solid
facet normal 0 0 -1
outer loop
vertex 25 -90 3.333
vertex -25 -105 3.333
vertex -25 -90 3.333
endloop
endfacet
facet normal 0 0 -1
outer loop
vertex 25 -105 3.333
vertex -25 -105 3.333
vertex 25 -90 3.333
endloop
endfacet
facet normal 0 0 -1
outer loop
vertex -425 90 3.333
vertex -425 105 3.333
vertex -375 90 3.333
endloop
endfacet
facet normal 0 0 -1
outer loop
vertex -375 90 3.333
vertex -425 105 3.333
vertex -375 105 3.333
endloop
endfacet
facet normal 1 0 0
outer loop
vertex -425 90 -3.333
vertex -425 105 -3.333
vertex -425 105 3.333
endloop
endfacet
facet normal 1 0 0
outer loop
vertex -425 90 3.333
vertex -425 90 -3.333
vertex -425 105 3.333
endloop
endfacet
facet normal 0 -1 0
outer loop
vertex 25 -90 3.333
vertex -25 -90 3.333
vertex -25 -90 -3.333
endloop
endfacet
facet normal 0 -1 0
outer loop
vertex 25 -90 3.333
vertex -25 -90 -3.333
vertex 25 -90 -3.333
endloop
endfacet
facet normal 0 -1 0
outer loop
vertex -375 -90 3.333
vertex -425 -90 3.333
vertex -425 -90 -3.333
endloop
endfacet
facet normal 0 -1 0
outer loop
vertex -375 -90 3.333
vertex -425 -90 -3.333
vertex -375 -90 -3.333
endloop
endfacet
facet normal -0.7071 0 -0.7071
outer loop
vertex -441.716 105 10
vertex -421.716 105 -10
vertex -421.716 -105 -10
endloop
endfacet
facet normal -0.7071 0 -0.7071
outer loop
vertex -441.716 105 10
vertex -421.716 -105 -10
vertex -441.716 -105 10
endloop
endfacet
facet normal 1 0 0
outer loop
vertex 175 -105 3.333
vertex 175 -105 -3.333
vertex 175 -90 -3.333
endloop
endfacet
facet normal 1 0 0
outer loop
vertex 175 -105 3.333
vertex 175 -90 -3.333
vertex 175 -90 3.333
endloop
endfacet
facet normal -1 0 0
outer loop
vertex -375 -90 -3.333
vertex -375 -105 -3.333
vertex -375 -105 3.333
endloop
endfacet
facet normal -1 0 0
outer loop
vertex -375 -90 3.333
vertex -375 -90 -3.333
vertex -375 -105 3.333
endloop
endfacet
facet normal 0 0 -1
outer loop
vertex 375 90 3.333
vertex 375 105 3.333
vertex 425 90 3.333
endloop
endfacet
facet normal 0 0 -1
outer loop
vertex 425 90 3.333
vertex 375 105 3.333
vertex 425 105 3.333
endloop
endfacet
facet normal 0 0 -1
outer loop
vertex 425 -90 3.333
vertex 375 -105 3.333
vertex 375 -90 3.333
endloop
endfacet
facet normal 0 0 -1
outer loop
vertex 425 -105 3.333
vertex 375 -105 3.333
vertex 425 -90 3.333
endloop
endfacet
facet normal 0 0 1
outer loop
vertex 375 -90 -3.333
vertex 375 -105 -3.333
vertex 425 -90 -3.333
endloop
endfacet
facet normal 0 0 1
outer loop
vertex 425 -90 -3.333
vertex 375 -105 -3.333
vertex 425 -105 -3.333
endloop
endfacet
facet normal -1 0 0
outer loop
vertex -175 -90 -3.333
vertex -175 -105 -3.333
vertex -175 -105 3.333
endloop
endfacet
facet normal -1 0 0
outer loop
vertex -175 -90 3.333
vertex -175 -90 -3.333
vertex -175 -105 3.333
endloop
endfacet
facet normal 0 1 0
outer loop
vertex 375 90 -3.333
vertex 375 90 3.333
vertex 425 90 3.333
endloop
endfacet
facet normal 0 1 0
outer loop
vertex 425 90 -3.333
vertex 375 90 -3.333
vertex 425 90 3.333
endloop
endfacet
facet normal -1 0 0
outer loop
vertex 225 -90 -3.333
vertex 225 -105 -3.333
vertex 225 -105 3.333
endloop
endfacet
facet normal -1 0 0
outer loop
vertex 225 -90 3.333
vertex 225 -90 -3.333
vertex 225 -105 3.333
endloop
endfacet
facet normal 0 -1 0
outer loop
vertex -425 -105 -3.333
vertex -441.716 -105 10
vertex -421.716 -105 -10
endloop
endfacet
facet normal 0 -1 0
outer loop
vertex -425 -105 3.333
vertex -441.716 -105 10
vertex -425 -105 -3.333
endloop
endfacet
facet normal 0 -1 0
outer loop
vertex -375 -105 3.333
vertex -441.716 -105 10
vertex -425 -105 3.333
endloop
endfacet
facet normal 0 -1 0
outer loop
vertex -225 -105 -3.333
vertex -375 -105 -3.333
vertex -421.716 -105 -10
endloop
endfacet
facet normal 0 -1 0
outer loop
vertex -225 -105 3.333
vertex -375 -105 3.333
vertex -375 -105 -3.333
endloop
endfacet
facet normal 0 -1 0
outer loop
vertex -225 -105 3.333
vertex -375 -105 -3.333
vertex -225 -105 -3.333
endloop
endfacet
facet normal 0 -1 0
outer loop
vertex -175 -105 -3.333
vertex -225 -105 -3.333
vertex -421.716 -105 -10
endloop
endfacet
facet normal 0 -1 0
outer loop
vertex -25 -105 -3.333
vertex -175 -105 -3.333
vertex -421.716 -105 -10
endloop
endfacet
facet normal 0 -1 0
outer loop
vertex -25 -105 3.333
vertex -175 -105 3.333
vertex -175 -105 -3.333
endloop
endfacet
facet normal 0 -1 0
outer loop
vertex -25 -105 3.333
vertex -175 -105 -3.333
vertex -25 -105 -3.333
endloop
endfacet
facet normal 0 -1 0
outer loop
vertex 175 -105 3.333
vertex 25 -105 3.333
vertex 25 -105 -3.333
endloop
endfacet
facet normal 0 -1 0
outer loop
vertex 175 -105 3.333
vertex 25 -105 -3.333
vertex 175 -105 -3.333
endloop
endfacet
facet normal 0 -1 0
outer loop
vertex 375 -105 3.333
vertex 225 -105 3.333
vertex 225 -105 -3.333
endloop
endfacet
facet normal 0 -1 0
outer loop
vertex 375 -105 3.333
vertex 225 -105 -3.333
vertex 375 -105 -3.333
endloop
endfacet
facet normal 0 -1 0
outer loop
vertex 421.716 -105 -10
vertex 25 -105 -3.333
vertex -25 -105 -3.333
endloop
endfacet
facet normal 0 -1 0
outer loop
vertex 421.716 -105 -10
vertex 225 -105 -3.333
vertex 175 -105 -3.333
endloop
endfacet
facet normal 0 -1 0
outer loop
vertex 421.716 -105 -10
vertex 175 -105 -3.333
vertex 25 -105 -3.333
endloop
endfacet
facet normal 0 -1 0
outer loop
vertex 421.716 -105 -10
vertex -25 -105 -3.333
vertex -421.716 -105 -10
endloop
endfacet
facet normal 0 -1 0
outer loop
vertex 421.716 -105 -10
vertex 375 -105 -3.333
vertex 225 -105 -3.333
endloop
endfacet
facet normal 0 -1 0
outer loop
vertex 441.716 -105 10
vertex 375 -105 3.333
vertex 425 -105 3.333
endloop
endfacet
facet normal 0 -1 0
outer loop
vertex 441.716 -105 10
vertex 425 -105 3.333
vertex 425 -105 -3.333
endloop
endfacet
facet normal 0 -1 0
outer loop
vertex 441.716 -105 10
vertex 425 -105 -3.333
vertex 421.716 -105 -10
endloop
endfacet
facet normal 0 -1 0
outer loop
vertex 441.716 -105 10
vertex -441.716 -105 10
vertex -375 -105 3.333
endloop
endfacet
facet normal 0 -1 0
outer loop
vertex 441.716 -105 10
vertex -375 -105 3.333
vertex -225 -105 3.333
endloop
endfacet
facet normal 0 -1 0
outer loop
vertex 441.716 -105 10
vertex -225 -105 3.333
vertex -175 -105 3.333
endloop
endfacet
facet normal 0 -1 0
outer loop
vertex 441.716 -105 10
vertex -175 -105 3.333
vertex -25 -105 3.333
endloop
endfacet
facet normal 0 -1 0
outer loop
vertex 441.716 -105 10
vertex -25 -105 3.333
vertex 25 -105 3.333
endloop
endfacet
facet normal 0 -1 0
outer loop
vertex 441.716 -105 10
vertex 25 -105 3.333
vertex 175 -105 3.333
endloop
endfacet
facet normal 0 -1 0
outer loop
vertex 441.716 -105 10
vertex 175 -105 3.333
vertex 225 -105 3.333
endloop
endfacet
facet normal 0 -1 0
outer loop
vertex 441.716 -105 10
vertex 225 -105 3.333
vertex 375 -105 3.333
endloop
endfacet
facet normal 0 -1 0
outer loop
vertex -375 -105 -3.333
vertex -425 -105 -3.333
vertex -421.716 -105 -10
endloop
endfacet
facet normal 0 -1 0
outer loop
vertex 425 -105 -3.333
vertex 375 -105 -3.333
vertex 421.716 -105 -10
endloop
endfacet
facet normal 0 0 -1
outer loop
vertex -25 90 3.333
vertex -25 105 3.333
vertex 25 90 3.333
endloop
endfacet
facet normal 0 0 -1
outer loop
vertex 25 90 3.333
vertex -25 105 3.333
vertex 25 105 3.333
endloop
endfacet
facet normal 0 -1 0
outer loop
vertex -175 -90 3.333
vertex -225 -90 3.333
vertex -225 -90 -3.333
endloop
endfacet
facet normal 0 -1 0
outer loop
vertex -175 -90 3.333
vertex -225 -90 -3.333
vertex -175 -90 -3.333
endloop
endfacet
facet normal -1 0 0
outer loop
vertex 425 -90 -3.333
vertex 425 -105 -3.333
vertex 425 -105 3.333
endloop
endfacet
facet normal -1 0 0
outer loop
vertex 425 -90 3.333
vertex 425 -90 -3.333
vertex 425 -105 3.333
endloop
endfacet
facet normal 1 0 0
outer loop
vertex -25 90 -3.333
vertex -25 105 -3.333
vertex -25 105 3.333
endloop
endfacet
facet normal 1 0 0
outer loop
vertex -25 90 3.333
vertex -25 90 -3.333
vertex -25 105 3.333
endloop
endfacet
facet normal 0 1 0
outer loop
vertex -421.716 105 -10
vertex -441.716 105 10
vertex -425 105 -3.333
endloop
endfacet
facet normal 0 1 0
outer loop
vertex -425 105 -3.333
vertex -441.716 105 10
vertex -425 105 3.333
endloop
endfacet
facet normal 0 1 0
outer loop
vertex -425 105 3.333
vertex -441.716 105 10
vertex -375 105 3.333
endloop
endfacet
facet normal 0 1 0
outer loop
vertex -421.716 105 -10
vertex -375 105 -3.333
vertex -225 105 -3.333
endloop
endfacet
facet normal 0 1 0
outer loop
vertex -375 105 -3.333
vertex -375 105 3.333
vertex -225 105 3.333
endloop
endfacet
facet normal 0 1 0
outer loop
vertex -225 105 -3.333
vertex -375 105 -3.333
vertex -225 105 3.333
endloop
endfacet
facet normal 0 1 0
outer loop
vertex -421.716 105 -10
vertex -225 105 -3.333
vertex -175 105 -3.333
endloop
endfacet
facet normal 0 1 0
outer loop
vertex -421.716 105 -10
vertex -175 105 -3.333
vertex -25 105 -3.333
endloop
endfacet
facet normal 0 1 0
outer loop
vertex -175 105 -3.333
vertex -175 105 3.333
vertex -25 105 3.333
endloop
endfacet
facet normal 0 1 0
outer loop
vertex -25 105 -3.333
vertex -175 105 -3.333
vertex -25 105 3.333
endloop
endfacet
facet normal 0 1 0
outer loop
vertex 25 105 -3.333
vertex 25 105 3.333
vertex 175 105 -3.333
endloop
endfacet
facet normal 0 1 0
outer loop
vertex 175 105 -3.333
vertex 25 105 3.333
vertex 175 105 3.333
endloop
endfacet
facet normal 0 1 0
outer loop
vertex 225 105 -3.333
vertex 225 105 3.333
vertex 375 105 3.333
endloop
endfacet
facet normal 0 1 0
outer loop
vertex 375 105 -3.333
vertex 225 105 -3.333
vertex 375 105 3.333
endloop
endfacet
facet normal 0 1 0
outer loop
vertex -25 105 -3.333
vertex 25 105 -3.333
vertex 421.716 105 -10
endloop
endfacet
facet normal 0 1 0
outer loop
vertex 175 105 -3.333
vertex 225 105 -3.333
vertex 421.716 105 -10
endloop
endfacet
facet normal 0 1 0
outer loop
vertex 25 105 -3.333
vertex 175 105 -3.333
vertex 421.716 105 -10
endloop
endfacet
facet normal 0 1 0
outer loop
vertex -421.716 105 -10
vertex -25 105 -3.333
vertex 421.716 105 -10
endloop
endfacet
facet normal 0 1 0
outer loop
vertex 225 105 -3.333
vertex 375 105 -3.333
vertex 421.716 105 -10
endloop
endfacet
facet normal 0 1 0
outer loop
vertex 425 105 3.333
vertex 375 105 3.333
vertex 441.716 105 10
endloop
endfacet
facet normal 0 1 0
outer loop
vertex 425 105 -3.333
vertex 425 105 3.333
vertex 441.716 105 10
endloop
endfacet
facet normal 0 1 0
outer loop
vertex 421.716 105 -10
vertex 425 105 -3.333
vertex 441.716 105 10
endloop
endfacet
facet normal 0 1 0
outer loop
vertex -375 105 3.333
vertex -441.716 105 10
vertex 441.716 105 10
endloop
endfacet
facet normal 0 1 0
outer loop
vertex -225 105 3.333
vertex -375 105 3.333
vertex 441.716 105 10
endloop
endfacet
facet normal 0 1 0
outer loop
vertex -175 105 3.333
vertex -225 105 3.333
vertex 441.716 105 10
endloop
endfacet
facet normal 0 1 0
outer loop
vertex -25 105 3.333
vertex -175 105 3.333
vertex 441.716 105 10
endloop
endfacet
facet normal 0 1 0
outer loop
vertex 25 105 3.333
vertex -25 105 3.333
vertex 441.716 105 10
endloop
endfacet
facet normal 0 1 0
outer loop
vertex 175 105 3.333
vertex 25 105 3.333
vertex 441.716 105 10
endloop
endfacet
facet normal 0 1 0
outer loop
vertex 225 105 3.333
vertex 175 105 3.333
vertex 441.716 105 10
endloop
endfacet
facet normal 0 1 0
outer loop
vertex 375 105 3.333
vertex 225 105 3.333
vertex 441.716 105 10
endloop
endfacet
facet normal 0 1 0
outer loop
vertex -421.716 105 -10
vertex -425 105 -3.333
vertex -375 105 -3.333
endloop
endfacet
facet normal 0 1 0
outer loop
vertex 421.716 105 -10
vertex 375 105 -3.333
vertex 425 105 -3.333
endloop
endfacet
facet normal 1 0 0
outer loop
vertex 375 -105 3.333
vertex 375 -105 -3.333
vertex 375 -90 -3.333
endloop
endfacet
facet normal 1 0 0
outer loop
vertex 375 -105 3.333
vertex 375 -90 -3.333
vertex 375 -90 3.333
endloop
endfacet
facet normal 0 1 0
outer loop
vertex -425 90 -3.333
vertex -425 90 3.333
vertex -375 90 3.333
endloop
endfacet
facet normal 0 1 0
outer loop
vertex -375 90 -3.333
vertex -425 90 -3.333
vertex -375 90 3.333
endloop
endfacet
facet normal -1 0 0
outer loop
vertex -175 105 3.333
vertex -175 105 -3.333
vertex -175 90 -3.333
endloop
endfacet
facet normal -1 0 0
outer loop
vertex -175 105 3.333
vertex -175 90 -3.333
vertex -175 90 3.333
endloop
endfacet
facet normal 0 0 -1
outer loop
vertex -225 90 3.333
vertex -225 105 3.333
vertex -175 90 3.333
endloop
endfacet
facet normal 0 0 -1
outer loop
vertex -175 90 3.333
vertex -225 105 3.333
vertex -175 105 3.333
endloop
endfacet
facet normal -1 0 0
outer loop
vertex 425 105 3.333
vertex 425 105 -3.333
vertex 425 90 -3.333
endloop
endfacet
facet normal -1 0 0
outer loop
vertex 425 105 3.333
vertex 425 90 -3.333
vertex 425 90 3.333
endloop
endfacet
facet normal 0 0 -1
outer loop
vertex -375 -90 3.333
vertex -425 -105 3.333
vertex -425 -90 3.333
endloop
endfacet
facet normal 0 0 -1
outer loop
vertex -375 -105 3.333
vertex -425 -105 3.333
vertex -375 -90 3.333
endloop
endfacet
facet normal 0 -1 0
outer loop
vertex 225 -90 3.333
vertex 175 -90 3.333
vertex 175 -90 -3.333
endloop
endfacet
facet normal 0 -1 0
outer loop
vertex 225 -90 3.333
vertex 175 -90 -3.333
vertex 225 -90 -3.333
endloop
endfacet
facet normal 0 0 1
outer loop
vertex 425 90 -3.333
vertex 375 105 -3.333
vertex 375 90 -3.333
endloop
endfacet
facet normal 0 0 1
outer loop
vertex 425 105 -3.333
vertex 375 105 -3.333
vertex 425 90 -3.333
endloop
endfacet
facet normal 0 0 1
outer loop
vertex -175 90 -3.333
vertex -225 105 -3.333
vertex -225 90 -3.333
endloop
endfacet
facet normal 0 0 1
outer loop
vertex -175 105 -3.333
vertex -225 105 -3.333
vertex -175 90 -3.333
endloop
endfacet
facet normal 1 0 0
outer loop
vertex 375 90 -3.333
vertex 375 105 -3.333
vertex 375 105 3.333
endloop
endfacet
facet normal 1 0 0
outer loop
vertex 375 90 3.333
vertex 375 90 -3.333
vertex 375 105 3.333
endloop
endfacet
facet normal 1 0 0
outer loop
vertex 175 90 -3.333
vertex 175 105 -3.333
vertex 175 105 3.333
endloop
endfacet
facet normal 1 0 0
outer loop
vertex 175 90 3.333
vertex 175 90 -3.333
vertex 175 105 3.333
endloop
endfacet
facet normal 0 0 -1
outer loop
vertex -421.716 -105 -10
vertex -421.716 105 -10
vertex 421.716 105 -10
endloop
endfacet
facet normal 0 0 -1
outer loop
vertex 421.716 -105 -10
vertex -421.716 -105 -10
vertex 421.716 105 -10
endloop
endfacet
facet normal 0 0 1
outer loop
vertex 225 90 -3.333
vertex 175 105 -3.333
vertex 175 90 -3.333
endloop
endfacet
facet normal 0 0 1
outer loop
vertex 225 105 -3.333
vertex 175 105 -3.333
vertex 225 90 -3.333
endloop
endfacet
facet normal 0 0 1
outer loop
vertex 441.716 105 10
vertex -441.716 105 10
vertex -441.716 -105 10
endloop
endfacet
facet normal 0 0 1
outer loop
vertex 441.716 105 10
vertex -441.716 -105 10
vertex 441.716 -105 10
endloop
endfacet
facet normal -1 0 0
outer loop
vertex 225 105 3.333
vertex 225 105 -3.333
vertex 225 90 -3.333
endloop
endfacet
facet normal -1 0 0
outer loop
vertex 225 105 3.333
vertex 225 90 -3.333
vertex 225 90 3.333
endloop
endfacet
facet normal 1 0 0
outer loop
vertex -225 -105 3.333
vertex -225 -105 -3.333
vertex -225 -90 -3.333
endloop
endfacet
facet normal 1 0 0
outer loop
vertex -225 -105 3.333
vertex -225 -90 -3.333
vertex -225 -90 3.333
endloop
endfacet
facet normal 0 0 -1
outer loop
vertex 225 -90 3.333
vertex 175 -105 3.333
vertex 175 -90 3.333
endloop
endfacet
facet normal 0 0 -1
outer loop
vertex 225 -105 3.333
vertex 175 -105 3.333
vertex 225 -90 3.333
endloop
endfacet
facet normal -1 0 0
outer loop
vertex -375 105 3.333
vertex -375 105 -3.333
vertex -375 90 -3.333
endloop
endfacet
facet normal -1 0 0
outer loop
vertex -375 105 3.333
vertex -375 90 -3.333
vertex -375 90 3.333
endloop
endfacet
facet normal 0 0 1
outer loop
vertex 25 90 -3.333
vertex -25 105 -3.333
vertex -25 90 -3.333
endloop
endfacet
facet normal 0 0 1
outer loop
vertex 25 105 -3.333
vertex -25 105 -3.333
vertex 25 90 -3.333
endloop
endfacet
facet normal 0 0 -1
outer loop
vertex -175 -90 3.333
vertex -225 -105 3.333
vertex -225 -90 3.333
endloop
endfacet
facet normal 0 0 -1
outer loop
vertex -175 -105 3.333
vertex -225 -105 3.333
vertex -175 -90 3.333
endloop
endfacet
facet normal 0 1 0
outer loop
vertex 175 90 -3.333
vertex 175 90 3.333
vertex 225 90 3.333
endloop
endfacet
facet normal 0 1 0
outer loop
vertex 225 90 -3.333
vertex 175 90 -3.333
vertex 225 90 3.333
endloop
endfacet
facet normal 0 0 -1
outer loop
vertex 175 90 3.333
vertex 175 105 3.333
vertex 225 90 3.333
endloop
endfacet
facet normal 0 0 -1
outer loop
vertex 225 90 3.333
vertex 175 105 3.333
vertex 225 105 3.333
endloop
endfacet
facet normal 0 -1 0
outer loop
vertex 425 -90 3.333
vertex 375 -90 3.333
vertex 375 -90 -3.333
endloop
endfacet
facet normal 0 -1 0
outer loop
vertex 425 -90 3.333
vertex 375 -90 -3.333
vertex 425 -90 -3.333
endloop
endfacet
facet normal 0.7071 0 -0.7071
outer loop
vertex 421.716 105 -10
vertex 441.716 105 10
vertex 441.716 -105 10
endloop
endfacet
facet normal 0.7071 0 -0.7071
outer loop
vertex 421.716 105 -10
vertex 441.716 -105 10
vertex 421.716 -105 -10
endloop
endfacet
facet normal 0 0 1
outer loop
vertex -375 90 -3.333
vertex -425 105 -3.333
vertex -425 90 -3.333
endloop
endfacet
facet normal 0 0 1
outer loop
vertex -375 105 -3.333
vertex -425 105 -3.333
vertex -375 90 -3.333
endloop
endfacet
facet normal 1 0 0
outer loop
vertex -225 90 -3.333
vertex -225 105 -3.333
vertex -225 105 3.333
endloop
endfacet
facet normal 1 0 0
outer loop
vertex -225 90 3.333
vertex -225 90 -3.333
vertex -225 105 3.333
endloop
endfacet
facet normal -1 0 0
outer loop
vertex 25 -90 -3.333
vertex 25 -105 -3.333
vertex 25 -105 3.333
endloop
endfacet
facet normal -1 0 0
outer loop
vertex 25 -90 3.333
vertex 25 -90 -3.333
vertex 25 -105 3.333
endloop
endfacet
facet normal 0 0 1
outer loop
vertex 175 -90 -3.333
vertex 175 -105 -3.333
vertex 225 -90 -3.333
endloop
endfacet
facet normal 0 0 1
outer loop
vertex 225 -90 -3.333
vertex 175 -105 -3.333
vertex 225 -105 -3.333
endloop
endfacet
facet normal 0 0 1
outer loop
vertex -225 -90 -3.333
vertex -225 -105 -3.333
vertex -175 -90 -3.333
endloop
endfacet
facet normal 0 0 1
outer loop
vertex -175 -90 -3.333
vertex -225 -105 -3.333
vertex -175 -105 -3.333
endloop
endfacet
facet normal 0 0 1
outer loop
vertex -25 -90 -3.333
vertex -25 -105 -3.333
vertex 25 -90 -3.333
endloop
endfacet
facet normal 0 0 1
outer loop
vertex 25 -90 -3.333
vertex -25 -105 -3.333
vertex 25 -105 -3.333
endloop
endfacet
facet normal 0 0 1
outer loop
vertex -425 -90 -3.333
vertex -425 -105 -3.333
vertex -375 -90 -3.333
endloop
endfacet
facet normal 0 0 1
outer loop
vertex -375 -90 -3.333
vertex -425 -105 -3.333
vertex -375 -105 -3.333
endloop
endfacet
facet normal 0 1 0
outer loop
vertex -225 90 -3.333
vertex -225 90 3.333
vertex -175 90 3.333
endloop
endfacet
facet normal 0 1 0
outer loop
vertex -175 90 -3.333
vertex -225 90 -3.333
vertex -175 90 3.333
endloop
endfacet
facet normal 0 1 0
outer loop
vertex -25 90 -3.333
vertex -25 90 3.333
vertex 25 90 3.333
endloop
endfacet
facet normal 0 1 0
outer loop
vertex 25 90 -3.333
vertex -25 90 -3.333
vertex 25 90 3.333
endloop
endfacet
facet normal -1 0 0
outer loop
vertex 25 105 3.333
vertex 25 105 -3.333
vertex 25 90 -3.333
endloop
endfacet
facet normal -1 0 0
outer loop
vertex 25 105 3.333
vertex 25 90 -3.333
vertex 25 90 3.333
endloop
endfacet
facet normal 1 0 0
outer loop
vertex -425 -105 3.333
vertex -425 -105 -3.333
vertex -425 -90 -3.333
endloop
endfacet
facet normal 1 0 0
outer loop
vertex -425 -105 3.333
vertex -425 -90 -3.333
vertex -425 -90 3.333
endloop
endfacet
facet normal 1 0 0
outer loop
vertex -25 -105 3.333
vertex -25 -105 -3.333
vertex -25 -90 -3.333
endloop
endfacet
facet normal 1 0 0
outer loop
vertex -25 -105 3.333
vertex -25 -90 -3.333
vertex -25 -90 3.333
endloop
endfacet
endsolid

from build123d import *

# Parameters (mm, degrees)
F1_W     = 1200
F1_H     = 210
F2_DEPTH = 10
F3_W     = 50
F3_H     = 6.6666666667
F4_DEPTH = 15
F6_DEPTH = 210.001


# Not quite as in the source:
# - a pattern or mirror of a feature is missing from the dataset's text; its kind, count and spacing are read off the source's solid


with BuildPart() as f2:
    # F1 (on Top) → F2 (new body, symmetric)
    with BuildSketch(Plane.XY):
        Rectangle(F1_W, F1_H)
    extrude(amount=F2_DEPTH, both=True)

    # F3 (on face) → F4 (cut)
    with BuildSketch(Plane.XZ.offset(105)):
        Rectangle(F3_W, F3_H)
        with Locations((200, 0)):
            Rectangle(F3_W, F3_H)
        with Locations((400, 0)):
            Rectangle(F3_W, F3_H)
        with Locations((-200, 0)):
            Rectangle(F3_W, F3_H)
        with Locations((-400, 0)):
            Rectangle(F3_W, F3_H)
    f4 = extrude(amount=-F4_DEPTH, mode=Mode.SUBTRACT)

    # F4_copies: F4 across plane
    add(f4.mirror(Plane.ZX), mode=Mode.SUBTRACT)

    # F5 (on face) → F6 (cut, through all)
    with BuildSketch(Plane.XZ.offset(105)):
        Polygon((-421.7155, -10), (-441.7155, 10), (-600, 10), (-600, -10), align=None)
        Polygon((600, -10), (600, 10), (441.7155, 10), (421.7155, -10), align=None)
    extrude(amount=-F6_DEPTH, mode=Mode.SUBTRACT)


solid = f2.part
